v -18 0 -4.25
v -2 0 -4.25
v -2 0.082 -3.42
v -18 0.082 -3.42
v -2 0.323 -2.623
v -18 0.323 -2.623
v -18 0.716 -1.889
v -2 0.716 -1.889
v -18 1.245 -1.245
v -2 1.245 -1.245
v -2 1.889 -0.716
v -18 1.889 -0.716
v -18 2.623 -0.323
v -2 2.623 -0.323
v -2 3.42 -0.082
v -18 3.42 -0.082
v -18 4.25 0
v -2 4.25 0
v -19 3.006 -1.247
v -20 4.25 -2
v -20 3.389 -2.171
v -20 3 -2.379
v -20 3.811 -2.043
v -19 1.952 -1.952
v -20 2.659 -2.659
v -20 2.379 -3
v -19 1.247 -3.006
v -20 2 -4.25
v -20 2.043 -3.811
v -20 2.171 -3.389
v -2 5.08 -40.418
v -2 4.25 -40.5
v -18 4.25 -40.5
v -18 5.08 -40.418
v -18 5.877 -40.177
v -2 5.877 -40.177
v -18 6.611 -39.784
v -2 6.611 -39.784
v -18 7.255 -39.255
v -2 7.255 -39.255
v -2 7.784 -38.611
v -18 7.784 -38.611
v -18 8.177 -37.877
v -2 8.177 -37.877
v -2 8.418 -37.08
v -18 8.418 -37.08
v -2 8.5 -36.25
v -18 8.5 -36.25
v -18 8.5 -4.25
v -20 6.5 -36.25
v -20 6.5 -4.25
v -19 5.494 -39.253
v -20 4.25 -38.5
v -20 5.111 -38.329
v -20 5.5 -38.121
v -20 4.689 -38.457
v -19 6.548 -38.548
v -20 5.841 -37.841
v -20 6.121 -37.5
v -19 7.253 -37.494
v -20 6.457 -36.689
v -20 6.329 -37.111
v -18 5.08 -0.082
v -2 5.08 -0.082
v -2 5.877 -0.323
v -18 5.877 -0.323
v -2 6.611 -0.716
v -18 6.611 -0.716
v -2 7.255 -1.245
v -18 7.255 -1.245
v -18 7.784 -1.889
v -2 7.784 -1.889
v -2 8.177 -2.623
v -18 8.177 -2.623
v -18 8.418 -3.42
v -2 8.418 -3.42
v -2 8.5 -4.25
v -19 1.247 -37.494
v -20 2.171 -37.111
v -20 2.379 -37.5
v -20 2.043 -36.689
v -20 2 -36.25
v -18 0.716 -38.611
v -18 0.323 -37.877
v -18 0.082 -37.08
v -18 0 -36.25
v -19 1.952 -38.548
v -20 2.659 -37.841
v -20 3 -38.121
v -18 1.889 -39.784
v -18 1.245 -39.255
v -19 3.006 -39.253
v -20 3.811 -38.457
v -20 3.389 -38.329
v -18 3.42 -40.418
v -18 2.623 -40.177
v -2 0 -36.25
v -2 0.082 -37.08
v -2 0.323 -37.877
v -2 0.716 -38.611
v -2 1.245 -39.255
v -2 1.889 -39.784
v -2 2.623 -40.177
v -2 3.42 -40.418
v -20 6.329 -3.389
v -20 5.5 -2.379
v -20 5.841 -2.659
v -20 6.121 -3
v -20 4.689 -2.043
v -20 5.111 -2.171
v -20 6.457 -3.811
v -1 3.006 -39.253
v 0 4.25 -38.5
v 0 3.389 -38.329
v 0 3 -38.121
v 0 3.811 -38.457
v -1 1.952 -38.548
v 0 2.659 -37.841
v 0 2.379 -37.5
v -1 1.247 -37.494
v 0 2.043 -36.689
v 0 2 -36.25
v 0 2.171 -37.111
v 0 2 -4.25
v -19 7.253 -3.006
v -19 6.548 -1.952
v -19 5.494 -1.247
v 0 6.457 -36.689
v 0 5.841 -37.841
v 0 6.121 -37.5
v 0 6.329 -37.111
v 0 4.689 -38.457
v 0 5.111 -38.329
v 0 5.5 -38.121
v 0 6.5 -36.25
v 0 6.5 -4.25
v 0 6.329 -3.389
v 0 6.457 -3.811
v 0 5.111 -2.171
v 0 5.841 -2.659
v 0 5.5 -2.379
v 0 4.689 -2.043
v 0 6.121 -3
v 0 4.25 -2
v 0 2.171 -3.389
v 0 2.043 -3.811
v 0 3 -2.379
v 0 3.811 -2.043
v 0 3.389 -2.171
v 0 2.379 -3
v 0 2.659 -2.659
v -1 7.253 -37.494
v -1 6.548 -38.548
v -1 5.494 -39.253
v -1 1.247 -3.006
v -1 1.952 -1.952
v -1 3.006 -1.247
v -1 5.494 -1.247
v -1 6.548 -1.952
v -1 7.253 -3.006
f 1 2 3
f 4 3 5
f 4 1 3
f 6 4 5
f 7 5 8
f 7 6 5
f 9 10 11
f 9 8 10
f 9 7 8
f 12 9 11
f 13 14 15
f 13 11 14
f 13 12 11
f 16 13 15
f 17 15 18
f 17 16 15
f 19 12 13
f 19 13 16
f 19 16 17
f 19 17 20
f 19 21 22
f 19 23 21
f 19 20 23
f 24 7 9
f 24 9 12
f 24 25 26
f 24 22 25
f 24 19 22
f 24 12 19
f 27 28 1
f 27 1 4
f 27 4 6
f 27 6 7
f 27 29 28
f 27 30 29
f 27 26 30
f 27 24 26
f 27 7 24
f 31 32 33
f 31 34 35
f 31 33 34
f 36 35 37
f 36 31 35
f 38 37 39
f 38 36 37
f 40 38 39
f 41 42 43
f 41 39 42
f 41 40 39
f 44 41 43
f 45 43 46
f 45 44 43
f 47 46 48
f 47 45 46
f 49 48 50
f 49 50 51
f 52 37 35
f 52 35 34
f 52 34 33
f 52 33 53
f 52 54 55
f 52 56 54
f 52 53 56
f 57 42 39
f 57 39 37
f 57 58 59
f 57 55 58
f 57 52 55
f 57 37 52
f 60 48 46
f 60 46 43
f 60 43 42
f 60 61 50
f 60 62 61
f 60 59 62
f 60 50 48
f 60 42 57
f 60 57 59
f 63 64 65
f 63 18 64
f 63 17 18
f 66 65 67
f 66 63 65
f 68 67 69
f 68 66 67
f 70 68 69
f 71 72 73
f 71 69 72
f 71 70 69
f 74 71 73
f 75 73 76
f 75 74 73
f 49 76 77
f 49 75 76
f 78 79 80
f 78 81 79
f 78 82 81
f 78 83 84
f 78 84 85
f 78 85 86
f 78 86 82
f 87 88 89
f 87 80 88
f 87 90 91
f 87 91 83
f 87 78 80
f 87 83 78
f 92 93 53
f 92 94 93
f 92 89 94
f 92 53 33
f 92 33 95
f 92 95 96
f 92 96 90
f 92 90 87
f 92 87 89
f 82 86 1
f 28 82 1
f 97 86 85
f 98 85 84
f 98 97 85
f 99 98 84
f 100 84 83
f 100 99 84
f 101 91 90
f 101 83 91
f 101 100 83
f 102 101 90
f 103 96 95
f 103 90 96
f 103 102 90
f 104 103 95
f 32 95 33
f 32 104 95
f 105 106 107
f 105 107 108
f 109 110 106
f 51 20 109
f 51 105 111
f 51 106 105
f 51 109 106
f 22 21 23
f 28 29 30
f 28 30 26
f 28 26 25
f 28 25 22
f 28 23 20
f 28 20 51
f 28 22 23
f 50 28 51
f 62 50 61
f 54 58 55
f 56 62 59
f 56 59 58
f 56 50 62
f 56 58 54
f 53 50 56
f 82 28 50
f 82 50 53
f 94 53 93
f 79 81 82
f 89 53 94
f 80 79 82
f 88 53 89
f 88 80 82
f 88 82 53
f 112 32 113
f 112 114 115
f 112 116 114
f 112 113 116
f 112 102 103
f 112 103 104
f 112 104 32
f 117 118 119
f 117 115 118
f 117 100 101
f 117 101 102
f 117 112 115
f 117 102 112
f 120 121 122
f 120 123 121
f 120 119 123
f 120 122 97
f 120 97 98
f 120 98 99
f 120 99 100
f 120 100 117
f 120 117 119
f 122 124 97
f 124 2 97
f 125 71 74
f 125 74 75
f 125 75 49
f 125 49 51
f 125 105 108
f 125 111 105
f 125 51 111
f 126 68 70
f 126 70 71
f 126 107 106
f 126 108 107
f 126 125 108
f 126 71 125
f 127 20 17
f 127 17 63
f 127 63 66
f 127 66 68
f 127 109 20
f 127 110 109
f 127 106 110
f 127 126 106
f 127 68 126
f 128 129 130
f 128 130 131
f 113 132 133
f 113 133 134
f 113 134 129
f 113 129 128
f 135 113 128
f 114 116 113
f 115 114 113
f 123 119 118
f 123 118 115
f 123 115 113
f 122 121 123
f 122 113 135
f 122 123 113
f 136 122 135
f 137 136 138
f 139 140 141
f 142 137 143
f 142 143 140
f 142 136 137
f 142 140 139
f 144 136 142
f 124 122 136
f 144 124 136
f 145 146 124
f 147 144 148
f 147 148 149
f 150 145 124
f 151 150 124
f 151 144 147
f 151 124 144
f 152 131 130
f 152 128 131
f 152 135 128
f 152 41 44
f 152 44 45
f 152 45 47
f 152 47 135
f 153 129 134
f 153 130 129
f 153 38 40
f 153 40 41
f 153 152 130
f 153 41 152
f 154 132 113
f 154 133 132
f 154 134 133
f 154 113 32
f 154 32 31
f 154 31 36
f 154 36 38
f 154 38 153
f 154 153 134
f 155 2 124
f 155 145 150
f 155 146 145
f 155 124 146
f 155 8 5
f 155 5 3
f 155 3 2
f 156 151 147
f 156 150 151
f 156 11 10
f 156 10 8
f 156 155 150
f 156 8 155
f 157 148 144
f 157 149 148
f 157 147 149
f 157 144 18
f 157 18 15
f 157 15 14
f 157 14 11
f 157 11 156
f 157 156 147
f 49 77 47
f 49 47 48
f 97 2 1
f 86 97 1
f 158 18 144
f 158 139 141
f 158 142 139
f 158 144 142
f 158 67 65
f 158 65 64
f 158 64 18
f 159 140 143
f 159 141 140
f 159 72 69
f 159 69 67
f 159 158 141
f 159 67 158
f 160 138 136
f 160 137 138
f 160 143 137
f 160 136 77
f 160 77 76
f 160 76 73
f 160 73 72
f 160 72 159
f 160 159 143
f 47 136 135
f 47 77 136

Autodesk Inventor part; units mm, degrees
ref_plane "YZ Plane" through (0, 0, 0) normal (1, 0, 0) x (0, 1, 0)
ref_plane "XZ Plane" through (0, 0, 0) normal (0, 1, 0) x (-1, 0, 0)
ref_plane "XY Plane" through (0, 0, 0) normal (0, 0, 1) x (1, 0, 0)
sketch "Sketch1" plane through (0, 0, 0) normal (0, 1, 0) x (-1, 0, 0)
  line L0 (0, 0) -> (20, 0)
  line L1 (20, 0) -> (20, -40.5)
  line L2 (20, -40.5) -> (0, -40.5)
  line L3 (0, -40.5) -> (0, 0)
  dimension "d0" = 20
  dimension "d1" = 40.5
extrude "Extrusion1" add sketch "Sketch1" along normal blind 8.5
fillet "Fillet1" radius 4.25 4 edges at (-10, 8.5, 0) (-10, 0, 0) (-10, 8.5, -40.5) (-10, 0, -40.5)
chamfer "Chamfer1" distance 2 angle 45 8 edges at (0, 8.5, -20.25) (0, 7.2554, -39.2554) (0, 0, -20.25) (0, 7.2554, -1.2446) (-20, 8.5, -20.25) (-20, 7.2554, -1.2446) (-20, 0, -20.25) (-20, 7.2554, -39.2554)
equation "\"d4\" = 0.5 * d2"
equation "\"d2\" = 8.5"
properties part number "battery"
